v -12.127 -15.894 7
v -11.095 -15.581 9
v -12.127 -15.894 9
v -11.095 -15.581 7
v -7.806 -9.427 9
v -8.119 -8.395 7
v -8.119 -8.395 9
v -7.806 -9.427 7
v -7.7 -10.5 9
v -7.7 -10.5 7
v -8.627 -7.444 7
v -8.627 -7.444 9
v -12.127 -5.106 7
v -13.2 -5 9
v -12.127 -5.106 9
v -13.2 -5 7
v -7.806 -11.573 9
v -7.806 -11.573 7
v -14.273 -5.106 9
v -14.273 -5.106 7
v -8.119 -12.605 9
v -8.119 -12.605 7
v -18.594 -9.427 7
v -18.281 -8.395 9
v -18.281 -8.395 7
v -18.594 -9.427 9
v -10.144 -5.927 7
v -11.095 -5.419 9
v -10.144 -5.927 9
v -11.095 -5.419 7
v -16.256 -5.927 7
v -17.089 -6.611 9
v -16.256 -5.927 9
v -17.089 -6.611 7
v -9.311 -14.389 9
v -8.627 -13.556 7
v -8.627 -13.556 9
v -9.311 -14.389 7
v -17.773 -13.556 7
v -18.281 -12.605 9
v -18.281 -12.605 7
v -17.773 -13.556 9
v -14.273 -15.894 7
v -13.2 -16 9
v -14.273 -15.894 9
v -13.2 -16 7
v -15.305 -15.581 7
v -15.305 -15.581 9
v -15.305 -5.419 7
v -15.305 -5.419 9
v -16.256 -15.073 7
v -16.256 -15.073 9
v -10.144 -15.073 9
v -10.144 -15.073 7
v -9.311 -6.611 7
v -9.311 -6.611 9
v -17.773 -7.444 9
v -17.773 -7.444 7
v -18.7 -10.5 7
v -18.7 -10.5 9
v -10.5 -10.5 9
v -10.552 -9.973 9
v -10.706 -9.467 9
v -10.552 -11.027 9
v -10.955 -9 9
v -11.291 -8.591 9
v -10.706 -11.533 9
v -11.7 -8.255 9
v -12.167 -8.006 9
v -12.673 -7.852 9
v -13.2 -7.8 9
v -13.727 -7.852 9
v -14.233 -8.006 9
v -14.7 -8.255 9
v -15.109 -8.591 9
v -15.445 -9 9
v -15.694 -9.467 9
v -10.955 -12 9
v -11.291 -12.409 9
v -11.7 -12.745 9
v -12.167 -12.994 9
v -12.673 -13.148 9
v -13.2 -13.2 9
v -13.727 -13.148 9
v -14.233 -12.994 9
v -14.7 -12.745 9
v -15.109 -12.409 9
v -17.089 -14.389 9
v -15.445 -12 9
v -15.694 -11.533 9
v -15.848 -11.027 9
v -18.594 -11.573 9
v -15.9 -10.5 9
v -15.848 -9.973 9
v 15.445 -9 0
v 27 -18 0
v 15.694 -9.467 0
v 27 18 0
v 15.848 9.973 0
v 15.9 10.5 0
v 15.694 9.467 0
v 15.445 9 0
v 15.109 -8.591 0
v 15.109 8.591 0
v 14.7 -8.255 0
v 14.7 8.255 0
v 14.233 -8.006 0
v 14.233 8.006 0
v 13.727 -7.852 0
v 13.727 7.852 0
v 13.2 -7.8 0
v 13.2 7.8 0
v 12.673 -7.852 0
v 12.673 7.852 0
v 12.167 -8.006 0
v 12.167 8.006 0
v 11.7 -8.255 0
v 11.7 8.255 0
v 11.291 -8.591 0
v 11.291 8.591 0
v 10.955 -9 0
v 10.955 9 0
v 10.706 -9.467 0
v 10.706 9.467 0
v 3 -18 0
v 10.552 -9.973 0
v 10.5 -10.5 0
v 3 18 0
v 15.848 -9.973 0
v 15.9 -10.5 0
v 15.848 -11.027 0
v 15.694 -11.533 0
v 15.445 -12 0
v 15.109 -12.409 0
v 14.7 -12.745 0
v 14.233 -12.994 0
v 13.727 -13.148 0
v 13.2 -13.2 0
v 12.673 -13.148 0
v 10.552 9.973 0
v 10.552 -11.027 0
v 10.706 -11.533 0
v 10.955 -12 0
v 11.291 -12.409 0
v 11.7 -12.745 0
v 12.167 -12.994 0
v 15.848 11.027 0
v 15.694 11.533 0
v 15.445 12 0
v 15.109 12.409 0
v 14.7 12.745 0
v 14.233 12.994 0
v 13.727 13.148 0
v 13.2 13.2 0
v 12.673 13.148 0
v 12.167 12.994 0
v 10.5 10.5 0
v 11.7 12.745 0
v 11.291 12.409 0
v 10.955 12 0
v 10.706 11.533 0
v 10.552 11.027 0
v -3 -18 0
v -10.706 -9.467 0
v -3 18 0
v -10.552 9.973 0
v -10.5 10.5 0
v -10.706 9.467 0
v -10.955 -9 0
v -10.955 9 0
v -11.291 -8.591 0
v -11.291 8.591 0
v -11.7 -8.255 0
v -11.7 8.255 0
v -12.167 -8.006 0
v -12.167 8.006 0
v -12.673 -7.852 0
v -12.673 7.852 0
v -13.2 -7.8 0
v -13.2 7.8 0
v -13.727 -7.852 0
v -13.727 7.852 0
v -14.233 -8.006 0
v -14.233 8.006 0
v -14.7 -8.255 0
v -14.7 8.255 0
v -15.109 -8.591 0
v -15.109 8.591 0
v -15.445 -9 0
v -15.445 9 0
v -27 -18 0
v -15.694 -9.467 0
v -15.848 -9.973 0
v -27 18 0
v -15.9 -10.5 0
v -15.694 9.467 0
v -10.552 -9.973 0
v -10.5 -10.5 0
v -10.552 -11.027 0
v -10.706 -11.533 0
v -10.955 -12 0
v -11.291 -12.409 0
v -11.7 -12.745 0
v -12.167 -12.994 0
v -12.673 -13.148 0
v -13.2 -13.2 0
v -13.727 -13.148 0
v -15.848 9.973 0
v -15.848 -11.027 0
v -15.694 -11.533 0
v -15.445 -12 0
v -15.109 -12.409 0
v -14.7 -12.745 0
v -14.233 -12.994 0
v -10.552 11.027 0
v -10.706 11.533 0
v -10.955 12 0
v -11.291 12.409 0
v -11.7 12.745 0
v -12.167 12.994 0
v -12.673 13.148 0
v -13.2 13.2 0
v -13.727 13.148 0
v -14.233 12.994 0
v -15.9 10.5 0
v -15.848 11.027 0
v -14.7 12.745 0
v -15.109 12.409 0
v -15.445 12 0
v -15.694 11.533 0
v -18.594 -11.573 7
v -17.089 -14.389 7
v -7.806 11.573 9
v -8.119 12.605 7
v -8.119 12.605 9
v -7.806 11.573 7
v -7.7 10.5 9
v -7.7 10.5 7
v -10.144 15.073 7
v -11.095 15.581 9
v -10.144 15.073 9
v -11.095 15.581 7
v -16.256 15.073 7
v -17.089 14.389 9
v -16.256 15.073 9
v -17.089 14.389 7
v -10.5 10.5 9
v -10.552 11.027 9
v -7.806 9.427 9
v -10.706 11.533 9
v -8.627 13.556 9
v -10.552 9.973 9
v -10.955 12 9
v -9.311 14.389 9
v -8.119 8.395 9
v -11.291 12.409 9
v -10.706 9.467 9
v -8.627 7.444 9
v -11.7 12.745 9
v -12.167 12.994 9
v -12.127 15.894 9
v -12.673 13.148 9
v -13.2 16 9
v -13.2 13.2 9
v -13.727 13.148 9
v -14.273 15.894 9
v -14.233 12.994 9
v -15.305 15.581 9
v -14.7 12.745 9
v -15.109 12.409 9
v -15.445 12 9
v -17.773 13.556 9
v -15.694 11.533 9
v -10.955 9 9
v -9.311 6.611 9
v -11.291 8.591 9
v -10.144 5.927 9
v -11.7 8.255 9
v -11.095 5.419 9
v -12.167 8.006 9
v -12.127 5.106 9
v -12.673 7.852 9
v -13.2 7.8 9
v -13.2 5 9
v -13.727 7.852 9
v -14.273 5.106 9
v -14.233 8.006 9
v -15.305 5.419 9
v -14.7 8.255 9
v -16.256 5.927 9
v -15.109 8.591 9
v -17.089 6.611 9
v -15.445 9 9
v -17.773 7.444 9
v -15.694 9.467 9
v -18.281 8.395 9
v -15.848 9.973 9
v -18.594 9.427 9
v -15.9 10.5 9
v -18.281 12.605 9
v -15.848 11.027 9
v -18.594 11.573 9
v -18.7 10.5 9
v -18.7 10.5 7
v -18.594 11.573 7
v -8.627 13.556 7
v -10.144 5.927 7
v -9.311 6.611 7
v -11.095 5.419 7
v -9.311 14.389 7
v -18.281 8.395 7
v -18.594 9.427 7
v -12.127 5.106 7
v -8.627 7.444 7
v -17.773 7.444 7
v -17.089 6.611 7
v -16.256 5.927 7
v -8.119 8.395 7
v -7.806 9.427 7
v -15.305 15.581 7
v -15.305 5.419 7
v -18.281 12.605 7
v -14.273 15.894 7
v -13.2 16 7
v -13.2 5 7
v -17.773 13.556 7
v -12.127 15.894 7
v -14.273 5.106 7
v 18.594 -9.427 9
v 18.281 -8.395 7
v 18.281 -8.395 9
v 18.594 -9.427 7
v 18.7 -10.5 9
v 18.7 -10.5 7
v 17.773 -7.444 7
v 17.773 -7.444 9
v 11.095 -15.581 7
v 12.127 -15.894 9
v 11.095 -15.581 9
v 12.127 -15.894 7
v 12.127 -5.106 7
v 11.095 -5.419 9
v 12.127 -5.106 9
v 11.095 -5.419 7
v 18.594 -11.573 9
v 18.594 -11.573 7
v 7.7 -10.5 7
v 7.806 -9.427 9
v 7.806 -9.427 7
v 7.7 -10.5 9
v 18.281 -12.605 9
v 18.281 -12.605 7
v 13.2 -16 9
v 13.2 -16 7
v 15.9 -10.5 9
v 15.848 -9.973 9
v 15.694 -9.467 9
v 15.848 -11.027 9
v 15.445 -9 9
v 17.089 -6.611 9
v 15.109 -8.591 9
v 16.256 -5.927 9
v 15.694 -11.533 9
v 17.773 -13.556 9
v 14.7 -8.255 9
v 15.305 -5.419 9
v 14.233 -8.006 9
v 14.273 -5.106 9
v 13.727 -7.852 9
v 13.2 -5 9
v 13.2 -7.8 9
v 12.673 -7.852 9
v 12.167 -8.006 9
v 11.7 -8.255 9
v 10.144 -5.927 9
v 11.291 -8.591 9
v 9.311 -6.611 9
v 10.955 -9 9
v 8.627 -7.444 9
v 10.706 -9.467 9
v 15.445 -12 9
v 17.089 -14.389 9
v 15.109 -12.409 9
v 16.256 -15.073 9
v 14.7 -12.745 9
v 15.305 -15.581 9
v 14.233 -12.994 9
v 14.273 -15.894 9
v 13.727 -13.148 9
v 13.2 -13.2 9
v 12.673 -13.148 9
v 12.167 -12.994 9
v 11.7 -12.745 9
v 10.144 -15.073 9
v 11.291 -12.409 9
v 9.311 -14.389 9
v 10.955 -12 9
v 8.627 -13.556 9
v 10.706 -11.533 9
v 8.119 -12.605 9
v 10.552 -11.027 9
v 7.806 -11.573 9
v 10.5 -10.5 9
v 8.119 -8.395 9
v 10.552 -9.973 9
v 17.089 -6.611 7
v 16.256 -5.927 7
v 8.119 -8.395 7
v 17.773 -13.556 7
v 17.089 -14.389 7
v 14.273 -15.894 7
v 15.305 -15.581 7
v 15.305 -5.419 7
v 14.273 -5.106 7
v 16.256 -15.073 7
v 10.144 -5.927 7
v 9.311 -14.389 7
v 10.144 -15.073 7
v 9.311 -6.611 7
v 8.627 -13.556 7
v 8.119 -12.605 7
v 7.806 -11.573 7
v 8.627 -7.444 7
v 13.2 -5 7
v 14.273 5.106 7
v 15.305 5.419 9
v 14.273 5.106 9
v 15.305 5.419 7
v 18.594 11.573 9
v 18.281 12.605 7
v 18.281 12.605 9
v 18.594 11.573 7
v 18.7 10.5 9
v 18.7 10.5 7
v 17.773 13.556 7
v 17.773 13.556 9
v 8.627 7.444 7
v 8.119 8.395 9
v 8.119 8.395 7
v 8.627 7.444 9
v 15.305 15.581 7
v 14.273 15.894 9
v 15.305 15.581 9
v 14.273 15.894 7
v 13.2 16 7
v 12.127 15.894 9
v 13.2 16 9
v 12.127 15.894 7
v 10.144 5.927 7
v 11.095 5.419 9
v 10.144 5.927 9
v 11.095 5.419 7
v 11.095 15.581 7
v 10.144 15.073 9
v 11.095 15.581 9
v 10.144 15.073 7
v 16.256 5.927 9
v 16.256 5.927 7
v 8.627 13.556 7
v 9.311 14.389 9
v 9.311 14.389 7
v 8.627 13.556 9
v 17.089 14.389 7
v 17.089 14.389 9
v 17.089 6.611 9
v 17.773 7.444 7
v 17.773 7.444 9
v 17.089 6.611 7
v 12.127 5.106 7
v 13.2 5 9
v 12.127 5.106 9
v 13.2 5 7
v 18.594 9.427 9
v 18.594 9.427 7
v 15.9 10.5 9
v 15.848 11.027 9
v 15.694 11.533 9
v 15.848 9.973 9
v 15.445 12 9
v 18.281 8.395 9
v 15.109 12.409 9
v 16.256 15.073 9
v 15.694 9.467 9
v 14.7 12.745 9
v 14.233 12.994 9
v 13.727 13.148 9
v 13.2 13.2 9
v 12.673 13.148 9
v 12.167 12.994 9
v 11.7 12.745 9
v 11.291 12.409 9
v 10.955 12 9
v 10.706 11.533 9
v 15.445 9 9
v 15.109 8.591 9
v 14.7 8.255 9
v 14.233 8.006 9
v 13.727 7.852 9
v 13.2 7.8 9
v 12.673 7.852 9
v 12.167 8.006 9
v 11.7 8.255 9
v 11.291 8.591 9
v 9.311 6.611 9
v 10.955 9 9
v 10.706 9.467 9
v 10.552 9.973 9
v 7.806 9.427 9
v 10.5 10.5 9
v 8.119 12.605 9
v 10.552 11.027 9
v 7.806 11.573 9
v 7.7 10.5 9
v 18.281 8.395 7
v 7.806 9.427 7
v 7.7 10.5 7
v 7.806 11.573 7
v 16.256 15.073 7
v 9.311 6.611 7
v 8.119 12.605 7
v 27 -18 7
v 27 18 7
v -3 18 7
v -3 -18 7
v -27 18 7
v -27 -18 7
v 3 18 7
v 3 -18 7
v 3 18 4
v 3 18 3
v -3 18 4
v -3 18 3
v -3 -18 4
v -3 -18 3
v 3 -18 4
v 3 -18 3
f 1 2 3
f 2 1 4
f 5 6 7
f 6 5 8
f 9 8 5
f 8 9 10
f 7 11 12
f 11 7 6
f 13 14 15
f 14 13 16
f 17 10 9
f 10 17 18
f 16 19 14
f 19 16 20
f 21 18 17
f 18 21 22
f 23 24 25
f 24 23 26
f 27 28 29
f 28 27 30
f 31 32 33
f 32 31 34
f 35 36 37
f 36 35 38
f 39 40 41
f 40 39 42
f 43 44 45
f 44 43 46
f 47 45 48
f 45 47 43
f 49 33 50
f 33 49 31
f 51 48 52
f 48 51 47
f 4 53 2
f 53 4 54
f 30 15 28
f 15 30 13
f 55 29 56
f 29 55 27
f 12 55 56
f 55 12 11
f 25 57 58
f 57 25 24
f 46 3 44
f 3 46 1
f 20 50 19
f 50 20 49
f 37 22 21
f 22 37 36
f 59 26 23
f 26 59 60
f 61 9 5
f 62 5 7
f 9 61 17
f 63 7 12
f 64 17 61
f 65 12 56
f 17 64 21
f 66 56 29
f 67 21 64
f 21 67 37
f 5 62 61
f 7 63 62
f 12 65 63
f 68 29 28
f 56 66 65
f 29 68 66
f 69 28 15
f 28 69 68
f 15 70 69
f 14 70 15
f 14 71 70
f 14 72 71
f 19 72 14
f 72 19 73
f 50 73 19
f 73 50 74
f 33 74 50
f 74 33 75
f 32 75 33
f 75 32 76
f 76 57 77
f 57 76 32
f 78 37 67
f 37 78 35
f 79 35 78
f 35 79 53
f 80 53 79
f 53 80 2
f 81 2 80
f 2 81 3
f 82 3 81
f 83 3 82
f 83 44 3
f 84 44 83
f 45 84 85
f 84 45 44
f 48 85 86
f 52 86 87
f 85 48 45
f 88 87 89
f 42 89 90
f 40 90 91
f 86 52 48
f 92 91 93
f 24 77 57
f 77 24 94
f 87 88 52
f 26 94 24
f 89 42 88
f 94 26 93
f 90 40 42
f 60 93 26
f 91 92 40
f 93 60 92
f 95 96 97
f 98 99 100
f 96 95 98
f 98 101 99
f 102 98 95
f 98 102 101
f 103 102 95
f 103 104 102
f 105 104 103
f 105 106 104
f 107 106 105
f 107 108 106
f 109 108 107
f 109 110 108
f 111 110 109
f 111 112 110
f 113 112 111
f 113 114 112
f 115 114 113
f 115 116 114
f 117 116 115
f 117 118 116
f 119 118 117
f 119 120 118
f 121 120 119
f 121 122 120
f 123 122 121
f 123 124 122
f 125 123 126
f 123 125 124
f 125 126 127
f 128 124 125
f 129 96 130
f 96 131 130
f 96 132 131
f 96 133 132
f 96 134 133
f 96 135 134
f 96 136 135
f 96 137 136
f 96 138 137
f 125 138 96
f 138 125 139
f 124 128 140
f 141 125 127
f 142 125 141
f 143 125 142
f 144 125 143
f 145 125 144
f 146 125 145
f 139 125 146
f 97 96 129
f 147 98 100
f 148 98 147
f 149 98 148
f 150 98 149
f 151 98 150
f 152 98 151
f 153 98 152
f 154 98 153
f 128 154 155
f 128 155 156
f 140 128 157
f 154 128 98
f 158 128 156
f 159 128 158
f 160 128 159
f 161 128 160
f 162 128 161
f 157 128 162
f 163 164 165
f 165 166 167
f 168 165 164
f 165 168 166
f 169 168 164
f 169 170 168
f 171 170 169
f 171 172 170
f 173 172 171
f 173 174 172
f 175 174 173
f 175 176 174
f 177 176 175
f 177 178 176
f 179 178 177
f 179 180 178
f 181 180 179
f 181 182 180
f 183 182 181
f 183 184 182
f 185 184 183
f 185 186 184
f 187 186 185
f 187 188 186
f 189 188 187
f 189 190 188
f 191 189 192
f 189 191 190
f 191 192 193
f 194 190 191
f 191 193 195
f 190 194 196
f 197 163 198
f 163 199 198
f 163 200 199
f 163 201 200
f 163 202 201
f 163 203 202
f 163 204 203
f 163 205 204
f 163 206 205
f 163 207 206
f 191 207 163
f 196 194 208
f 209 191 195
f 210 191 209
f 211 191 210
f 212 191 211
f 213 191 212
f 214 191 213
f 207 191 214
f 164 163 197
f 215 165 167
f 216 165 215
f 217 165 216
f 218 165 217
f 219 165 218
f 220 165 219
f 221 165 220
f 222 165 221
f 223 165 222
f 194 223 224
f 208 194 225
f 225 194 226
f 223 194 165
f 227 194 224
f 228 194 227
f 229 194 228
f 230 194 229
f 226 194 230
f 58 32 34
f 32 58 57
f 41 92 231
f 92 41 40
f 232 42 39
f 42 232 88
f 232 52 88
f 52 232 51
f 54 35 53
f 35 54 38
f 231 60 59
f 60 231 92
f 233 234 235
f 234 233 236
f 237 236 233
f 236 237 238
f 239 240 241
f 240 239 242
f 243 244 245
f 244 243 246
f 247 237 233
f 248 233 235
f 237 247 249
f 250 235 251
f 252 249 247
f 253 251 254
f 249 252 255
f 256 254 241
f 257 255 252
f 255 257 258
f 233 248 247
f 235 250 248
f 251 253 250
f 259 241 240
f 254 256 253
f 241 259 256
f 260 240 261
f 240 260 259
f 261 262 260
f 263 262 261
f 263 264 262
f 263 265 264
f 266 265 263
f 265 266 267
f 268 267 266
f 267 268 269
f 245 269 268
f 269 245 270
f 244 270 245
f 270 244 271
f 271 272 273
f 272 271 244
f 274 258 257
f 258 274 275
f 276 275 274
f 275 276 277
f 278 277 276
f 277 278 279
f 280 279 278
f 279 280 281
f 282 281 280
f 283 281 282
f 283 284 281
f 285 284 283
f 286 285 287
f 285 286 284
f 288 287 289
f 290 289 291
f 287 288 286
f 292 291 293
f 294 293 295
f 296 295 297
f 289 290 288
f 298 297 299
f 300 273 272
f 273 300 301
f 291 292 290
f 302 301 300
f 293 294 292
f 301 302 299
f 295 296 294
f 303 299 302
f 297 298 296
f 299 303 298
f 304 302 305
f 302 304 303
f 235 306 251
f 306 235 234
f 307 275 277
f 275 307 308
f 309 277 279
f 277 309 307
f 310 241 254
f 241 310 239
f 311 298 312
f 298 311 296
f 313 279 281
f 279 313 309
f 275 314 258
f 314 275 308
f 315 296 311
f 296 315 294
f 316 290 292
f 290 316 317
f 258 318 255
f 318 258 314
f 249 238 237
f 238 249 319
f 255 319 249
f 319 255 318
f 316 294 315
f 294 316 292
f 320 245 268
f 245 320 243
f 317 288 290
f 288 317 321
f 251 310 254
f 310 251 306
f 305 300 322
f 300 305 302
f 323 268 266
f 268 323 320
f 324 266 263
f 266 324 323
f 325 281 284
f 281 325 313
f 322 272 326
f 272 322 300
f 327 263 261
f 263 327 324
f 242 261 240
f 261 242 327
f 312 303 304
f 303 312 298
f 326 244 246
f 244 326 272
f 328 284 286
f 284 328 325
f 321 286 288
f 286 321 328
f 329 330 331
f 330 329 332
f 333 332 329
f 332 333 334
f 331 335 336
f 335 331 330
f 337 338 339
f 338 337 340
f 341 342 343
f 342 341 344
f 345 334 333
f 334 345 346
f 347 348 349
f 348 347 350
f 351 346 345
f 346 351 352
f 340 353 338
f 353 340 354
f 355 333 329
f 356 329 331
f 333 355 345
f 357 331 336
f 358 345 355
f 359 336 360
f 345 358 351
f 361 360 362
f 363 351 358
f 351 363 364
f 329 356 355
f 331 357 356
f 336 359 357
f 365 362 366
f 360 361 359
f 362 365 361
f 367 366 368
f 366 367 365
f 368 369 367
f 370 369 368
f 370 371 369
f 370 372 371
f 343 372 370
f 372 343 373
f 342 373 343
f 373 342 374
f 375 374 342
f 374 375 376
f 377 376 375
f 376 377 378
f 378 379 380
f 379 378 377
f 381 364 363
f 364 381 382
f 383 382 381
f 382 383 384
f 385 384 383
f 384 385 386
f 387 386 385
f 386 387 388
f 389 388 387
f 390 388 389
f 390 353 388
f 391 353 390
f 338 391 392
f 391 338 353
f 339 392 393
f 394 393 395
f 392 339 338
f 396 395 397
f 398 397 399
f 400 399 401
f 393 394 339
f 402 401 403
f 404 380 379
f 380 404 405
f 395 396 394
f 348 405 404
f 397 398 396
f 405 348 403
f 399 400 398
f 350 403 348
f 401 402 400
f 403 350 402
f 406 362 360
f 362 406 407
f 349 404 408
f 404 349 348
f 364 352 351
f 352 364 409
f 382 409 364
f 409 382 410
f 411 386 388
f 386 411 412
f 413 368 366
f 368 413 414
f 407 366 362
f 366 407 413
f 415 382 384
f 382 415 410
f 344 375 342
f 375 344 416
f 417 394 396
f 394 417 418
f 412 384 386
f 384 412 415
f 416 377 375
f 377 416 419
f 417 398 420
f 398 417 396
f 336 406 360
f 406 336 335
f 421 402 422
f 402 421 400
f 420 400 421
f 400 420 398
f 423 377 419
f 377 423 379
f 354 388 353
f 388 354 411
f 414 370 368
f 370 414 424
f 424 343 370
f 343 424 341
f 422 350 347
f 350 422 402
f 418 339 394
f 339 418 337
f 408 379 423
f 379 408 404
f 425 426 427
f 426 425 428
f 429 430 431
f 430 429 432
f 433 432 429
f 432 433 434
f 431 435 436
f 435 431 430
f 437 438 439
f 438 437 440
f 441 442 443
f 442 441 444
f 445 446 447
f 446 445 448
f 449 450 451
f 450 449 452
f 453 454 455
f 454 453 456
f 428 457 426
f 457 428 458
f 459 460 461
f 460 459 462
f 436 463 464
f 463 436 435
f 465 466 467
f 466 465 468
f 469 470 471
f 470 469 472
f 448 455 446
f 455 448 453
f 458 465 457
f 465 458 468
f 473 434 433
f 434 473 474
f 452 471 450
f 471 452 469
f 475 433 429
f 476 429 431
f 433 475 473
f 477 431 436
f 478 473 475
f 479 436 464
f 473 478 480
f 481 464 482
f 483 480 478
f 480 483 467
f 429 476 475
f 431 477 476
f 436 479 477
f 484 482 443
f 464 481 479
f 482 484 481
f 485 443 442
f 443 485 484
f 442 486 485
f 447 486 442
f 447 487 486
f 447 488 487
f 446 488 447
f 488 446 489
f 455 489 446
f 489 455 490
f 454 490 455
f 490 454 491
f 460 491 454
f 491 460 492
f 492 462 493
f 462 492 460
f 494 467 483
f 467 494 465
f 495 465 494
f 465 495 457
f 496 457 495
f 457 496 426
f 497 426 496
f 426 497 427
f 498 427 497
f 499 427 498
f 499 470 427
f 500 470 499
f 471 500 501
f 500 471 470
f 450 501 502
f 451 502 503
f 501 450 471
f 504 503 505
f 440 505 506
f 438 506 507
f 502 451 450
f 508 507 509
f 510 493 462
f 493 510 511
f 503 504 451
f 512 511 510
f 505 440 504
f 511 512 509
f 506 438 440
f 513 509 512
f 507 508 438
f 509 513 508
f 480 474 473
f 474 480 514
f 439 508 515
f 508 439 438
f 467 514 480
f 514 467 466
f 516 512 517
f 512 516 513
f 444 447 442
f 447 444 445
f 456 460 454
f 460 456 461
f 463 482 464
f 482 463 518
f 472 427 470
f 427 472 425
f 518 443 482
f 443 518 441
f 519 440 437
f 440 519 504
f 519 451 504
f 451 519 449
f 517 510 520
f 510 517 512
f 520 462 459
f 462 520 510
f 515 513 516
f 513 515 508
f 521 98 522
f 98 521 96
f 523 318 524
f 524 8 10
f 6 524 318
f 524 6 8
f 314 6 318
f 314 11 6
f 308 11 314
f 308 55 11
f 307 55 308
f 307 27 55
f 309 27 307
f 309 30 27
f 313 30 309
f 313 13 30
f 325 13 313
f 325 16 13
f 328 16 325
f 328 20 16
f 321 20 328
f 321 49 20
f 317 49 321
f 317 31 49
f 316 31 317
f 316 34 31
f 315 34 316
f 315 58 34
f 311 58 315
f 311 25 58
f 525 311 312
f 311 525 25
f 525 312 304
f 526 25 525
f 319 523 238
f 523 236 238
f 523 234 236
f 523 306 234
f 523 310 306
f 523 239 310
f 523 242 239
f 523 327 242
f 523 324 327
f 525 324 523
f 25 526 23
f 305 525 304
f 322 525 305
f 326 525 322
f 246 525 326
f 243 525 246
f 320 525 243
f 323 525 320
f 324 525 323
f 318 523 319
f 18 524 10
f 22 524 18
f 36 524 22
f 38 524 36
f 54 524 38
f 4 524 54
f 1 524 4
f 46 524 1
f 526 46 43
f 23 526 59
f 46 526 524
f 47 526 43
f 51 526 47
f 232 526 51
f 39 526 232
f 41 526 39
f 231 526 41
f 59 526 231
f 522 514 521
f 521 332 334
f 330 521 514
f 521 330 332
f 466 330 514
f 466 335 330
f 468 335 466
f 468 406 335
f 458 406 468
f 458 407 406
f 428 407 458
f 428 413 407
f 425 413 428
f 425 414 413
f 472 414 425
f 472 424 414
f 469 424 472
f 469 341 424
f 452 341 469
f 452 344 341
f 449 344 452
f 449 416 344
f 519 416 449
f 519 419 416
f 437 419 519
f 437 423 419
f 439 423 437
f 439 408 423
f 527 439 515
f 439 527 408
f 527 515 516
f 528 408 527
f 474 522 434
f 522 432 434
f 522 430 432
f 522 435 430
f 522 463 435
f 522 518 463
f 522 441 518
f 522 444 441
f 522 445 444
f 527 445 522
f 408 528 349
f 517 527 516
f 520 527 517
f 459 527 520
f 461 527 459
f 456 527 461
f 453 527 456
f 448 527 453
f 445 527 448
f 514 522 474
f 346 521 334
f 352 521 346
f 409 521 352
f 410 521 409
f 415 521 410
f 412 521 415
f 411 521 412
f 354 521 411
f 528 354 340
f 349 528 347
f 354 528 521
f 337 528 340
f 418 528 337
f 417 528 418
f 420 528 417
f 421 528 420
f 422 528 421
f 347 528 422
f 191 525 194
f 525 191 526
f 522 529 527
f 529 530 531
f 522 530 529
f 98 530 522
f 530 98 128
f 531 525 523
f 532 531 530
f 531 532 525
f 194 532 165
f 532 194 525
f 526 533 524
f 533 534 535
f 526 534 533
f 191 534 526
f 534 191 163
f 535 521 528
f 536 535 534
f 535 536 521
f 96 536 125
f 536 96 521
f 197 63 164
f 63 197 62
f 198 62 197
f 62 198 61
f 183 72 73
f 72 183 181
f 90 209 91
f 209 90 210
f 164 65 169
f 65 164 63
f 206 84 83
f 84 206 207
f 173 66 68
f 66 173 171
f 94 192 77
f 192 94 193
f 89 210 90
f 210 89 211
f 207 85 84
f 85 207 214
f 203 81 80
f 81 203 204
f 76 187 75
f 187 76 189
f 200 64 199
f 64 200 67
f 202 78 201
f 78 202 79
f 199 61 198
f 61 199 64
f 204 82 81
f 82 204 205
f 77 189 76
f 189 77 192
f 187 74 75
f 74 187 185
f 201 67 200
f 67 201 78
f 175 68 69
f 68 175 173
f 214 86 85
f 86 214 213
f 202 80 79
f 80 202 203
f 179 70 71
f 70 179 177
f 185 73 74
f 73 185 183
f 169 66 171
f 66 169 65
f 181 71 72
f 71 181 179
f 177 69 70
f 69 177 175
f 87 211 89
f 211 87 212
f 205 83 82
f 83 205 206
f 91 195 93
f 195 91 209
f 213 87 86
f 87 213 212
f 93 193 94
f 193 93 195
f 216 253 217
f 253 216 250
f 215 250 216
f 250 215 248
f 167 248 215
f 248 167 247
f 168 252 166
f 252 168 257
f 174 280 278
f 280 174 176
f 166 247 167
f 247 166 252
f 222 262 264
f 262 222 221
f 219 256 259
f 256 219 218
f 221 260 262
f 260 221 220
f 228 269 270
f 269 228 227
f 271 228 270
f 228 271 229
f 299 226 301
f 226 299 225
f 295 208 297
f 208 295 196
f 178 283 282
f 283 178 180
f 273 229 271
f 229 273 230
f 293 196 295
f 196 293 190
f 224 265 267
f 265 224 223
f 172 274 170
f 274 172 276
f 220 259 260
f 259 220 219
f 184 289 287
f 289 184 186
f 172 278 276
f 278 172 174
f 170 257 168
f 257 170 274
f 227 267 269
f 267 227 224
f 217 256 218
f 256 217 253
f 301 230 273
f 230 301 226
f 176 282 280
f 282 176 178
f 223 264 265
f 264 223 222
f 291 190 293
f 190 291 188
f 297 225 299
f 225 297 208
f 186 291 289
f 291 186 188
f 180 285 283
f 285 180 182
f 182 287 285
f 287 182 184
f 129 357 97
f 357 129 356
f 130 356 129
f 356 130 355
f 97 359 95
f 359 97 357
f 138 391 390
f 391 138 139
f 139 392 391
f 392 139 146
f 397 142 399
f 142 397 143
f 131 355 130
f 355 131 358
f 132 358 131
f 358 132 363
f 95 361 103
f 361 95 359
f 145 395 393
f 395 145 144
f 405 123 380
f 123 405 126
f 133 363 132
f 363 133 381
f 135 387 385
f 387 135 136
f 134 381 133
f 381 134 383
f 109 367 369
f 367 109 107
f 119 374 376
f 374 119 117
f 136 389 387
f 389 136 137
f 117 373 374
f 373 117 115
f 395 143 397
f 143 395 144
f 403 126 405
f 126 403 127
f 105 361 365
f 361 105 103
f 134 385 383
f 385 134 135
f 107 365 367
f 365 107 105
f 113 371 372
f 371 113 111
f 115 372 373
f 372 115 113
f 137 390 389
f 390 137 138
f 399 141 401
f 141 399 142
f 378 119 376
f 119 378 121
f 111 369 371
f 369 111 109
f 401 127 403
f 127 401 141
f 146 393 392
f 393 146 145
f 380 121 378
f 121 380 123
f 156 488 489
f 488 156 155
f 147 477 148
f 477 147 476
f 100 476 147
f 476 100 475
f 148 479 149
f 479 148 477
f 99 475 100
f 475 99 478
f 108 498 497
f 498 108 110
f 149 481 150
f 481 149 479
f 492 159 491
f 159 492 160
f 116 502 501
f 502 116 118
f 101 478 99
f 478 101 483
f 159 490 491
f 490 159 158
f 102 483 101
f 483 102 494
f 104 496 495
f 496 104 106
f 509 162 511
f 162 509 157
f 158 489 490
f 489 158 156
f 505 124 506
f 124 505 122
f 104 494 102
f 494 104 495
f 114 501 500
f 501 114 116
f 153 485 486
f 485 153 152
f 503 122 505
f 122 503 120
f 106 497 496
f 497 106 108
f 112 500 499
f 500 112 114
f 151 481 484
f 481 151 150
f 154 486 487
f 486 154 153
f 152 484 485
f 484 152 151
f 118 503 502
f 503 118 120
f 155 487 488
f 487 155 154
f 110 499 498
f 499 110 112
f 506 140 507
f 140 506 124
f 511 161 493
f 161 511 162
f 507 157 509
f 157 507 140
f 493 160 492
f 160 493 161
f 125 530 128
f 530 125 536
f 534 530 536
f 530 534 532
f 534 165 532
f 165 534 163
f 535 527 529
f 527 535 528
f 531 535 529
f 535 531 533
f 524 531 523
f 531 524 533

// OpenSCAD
$fn = 32;

// ----------------------------------------------------------------------
// Living hinge: 54 x 36 mm plates, 1 mm flexible web
// ----------------------------------------------------------------------

// --- parameters (mm) ---
plate_len = 24;           // plate length outside the web
plate_w = 36;             // plate width
thick = 7;                // plate thickness
web_half = 3;             // half width of the flex band
web_t = 1;                // flexible web thickness
web_z = 3;                // web position inside the thickness
boss_d = 11;              // screw boss diameter
boss_h = 9;               // screw boss height
boss_x = 13.2;            // screw boss distance from the web
screw_d = 5.4;            // screw hole

difference() {
  union() {
    /* one flat strip, later thinned at the middle */
    translate([-27, -18, 0]) cube([54, 36, 7]);
    /* screw bosses, sunk 0.5 mm into the plates */
    for (sx = [-13.2, 13.2]) {
      for (sy = [-10.5, 10.5]) {
        translate([sx, sy, 0]) cylinder(h = boss_h, d = boss_d);
      }
    }
  }
  /* channel from below: leaves the web on top of it */
  translate([-3, -20.5, -2.5]) cube([6, 41, 5.5]);
  /* channel from above: thins the web down to web_t */
  translate([-3, -20.5, 4]) cube([6, 41, 5.5]);
  /* screw holes through the bosses */
  for (sx = [-13.2, 13.2]) {
    for (sy = [-10.5, 10.5]) {
      translate([sx, sy, -2.5]) cylinder(h = boss_h + 5, d = screw_d);
    }
  }
}
